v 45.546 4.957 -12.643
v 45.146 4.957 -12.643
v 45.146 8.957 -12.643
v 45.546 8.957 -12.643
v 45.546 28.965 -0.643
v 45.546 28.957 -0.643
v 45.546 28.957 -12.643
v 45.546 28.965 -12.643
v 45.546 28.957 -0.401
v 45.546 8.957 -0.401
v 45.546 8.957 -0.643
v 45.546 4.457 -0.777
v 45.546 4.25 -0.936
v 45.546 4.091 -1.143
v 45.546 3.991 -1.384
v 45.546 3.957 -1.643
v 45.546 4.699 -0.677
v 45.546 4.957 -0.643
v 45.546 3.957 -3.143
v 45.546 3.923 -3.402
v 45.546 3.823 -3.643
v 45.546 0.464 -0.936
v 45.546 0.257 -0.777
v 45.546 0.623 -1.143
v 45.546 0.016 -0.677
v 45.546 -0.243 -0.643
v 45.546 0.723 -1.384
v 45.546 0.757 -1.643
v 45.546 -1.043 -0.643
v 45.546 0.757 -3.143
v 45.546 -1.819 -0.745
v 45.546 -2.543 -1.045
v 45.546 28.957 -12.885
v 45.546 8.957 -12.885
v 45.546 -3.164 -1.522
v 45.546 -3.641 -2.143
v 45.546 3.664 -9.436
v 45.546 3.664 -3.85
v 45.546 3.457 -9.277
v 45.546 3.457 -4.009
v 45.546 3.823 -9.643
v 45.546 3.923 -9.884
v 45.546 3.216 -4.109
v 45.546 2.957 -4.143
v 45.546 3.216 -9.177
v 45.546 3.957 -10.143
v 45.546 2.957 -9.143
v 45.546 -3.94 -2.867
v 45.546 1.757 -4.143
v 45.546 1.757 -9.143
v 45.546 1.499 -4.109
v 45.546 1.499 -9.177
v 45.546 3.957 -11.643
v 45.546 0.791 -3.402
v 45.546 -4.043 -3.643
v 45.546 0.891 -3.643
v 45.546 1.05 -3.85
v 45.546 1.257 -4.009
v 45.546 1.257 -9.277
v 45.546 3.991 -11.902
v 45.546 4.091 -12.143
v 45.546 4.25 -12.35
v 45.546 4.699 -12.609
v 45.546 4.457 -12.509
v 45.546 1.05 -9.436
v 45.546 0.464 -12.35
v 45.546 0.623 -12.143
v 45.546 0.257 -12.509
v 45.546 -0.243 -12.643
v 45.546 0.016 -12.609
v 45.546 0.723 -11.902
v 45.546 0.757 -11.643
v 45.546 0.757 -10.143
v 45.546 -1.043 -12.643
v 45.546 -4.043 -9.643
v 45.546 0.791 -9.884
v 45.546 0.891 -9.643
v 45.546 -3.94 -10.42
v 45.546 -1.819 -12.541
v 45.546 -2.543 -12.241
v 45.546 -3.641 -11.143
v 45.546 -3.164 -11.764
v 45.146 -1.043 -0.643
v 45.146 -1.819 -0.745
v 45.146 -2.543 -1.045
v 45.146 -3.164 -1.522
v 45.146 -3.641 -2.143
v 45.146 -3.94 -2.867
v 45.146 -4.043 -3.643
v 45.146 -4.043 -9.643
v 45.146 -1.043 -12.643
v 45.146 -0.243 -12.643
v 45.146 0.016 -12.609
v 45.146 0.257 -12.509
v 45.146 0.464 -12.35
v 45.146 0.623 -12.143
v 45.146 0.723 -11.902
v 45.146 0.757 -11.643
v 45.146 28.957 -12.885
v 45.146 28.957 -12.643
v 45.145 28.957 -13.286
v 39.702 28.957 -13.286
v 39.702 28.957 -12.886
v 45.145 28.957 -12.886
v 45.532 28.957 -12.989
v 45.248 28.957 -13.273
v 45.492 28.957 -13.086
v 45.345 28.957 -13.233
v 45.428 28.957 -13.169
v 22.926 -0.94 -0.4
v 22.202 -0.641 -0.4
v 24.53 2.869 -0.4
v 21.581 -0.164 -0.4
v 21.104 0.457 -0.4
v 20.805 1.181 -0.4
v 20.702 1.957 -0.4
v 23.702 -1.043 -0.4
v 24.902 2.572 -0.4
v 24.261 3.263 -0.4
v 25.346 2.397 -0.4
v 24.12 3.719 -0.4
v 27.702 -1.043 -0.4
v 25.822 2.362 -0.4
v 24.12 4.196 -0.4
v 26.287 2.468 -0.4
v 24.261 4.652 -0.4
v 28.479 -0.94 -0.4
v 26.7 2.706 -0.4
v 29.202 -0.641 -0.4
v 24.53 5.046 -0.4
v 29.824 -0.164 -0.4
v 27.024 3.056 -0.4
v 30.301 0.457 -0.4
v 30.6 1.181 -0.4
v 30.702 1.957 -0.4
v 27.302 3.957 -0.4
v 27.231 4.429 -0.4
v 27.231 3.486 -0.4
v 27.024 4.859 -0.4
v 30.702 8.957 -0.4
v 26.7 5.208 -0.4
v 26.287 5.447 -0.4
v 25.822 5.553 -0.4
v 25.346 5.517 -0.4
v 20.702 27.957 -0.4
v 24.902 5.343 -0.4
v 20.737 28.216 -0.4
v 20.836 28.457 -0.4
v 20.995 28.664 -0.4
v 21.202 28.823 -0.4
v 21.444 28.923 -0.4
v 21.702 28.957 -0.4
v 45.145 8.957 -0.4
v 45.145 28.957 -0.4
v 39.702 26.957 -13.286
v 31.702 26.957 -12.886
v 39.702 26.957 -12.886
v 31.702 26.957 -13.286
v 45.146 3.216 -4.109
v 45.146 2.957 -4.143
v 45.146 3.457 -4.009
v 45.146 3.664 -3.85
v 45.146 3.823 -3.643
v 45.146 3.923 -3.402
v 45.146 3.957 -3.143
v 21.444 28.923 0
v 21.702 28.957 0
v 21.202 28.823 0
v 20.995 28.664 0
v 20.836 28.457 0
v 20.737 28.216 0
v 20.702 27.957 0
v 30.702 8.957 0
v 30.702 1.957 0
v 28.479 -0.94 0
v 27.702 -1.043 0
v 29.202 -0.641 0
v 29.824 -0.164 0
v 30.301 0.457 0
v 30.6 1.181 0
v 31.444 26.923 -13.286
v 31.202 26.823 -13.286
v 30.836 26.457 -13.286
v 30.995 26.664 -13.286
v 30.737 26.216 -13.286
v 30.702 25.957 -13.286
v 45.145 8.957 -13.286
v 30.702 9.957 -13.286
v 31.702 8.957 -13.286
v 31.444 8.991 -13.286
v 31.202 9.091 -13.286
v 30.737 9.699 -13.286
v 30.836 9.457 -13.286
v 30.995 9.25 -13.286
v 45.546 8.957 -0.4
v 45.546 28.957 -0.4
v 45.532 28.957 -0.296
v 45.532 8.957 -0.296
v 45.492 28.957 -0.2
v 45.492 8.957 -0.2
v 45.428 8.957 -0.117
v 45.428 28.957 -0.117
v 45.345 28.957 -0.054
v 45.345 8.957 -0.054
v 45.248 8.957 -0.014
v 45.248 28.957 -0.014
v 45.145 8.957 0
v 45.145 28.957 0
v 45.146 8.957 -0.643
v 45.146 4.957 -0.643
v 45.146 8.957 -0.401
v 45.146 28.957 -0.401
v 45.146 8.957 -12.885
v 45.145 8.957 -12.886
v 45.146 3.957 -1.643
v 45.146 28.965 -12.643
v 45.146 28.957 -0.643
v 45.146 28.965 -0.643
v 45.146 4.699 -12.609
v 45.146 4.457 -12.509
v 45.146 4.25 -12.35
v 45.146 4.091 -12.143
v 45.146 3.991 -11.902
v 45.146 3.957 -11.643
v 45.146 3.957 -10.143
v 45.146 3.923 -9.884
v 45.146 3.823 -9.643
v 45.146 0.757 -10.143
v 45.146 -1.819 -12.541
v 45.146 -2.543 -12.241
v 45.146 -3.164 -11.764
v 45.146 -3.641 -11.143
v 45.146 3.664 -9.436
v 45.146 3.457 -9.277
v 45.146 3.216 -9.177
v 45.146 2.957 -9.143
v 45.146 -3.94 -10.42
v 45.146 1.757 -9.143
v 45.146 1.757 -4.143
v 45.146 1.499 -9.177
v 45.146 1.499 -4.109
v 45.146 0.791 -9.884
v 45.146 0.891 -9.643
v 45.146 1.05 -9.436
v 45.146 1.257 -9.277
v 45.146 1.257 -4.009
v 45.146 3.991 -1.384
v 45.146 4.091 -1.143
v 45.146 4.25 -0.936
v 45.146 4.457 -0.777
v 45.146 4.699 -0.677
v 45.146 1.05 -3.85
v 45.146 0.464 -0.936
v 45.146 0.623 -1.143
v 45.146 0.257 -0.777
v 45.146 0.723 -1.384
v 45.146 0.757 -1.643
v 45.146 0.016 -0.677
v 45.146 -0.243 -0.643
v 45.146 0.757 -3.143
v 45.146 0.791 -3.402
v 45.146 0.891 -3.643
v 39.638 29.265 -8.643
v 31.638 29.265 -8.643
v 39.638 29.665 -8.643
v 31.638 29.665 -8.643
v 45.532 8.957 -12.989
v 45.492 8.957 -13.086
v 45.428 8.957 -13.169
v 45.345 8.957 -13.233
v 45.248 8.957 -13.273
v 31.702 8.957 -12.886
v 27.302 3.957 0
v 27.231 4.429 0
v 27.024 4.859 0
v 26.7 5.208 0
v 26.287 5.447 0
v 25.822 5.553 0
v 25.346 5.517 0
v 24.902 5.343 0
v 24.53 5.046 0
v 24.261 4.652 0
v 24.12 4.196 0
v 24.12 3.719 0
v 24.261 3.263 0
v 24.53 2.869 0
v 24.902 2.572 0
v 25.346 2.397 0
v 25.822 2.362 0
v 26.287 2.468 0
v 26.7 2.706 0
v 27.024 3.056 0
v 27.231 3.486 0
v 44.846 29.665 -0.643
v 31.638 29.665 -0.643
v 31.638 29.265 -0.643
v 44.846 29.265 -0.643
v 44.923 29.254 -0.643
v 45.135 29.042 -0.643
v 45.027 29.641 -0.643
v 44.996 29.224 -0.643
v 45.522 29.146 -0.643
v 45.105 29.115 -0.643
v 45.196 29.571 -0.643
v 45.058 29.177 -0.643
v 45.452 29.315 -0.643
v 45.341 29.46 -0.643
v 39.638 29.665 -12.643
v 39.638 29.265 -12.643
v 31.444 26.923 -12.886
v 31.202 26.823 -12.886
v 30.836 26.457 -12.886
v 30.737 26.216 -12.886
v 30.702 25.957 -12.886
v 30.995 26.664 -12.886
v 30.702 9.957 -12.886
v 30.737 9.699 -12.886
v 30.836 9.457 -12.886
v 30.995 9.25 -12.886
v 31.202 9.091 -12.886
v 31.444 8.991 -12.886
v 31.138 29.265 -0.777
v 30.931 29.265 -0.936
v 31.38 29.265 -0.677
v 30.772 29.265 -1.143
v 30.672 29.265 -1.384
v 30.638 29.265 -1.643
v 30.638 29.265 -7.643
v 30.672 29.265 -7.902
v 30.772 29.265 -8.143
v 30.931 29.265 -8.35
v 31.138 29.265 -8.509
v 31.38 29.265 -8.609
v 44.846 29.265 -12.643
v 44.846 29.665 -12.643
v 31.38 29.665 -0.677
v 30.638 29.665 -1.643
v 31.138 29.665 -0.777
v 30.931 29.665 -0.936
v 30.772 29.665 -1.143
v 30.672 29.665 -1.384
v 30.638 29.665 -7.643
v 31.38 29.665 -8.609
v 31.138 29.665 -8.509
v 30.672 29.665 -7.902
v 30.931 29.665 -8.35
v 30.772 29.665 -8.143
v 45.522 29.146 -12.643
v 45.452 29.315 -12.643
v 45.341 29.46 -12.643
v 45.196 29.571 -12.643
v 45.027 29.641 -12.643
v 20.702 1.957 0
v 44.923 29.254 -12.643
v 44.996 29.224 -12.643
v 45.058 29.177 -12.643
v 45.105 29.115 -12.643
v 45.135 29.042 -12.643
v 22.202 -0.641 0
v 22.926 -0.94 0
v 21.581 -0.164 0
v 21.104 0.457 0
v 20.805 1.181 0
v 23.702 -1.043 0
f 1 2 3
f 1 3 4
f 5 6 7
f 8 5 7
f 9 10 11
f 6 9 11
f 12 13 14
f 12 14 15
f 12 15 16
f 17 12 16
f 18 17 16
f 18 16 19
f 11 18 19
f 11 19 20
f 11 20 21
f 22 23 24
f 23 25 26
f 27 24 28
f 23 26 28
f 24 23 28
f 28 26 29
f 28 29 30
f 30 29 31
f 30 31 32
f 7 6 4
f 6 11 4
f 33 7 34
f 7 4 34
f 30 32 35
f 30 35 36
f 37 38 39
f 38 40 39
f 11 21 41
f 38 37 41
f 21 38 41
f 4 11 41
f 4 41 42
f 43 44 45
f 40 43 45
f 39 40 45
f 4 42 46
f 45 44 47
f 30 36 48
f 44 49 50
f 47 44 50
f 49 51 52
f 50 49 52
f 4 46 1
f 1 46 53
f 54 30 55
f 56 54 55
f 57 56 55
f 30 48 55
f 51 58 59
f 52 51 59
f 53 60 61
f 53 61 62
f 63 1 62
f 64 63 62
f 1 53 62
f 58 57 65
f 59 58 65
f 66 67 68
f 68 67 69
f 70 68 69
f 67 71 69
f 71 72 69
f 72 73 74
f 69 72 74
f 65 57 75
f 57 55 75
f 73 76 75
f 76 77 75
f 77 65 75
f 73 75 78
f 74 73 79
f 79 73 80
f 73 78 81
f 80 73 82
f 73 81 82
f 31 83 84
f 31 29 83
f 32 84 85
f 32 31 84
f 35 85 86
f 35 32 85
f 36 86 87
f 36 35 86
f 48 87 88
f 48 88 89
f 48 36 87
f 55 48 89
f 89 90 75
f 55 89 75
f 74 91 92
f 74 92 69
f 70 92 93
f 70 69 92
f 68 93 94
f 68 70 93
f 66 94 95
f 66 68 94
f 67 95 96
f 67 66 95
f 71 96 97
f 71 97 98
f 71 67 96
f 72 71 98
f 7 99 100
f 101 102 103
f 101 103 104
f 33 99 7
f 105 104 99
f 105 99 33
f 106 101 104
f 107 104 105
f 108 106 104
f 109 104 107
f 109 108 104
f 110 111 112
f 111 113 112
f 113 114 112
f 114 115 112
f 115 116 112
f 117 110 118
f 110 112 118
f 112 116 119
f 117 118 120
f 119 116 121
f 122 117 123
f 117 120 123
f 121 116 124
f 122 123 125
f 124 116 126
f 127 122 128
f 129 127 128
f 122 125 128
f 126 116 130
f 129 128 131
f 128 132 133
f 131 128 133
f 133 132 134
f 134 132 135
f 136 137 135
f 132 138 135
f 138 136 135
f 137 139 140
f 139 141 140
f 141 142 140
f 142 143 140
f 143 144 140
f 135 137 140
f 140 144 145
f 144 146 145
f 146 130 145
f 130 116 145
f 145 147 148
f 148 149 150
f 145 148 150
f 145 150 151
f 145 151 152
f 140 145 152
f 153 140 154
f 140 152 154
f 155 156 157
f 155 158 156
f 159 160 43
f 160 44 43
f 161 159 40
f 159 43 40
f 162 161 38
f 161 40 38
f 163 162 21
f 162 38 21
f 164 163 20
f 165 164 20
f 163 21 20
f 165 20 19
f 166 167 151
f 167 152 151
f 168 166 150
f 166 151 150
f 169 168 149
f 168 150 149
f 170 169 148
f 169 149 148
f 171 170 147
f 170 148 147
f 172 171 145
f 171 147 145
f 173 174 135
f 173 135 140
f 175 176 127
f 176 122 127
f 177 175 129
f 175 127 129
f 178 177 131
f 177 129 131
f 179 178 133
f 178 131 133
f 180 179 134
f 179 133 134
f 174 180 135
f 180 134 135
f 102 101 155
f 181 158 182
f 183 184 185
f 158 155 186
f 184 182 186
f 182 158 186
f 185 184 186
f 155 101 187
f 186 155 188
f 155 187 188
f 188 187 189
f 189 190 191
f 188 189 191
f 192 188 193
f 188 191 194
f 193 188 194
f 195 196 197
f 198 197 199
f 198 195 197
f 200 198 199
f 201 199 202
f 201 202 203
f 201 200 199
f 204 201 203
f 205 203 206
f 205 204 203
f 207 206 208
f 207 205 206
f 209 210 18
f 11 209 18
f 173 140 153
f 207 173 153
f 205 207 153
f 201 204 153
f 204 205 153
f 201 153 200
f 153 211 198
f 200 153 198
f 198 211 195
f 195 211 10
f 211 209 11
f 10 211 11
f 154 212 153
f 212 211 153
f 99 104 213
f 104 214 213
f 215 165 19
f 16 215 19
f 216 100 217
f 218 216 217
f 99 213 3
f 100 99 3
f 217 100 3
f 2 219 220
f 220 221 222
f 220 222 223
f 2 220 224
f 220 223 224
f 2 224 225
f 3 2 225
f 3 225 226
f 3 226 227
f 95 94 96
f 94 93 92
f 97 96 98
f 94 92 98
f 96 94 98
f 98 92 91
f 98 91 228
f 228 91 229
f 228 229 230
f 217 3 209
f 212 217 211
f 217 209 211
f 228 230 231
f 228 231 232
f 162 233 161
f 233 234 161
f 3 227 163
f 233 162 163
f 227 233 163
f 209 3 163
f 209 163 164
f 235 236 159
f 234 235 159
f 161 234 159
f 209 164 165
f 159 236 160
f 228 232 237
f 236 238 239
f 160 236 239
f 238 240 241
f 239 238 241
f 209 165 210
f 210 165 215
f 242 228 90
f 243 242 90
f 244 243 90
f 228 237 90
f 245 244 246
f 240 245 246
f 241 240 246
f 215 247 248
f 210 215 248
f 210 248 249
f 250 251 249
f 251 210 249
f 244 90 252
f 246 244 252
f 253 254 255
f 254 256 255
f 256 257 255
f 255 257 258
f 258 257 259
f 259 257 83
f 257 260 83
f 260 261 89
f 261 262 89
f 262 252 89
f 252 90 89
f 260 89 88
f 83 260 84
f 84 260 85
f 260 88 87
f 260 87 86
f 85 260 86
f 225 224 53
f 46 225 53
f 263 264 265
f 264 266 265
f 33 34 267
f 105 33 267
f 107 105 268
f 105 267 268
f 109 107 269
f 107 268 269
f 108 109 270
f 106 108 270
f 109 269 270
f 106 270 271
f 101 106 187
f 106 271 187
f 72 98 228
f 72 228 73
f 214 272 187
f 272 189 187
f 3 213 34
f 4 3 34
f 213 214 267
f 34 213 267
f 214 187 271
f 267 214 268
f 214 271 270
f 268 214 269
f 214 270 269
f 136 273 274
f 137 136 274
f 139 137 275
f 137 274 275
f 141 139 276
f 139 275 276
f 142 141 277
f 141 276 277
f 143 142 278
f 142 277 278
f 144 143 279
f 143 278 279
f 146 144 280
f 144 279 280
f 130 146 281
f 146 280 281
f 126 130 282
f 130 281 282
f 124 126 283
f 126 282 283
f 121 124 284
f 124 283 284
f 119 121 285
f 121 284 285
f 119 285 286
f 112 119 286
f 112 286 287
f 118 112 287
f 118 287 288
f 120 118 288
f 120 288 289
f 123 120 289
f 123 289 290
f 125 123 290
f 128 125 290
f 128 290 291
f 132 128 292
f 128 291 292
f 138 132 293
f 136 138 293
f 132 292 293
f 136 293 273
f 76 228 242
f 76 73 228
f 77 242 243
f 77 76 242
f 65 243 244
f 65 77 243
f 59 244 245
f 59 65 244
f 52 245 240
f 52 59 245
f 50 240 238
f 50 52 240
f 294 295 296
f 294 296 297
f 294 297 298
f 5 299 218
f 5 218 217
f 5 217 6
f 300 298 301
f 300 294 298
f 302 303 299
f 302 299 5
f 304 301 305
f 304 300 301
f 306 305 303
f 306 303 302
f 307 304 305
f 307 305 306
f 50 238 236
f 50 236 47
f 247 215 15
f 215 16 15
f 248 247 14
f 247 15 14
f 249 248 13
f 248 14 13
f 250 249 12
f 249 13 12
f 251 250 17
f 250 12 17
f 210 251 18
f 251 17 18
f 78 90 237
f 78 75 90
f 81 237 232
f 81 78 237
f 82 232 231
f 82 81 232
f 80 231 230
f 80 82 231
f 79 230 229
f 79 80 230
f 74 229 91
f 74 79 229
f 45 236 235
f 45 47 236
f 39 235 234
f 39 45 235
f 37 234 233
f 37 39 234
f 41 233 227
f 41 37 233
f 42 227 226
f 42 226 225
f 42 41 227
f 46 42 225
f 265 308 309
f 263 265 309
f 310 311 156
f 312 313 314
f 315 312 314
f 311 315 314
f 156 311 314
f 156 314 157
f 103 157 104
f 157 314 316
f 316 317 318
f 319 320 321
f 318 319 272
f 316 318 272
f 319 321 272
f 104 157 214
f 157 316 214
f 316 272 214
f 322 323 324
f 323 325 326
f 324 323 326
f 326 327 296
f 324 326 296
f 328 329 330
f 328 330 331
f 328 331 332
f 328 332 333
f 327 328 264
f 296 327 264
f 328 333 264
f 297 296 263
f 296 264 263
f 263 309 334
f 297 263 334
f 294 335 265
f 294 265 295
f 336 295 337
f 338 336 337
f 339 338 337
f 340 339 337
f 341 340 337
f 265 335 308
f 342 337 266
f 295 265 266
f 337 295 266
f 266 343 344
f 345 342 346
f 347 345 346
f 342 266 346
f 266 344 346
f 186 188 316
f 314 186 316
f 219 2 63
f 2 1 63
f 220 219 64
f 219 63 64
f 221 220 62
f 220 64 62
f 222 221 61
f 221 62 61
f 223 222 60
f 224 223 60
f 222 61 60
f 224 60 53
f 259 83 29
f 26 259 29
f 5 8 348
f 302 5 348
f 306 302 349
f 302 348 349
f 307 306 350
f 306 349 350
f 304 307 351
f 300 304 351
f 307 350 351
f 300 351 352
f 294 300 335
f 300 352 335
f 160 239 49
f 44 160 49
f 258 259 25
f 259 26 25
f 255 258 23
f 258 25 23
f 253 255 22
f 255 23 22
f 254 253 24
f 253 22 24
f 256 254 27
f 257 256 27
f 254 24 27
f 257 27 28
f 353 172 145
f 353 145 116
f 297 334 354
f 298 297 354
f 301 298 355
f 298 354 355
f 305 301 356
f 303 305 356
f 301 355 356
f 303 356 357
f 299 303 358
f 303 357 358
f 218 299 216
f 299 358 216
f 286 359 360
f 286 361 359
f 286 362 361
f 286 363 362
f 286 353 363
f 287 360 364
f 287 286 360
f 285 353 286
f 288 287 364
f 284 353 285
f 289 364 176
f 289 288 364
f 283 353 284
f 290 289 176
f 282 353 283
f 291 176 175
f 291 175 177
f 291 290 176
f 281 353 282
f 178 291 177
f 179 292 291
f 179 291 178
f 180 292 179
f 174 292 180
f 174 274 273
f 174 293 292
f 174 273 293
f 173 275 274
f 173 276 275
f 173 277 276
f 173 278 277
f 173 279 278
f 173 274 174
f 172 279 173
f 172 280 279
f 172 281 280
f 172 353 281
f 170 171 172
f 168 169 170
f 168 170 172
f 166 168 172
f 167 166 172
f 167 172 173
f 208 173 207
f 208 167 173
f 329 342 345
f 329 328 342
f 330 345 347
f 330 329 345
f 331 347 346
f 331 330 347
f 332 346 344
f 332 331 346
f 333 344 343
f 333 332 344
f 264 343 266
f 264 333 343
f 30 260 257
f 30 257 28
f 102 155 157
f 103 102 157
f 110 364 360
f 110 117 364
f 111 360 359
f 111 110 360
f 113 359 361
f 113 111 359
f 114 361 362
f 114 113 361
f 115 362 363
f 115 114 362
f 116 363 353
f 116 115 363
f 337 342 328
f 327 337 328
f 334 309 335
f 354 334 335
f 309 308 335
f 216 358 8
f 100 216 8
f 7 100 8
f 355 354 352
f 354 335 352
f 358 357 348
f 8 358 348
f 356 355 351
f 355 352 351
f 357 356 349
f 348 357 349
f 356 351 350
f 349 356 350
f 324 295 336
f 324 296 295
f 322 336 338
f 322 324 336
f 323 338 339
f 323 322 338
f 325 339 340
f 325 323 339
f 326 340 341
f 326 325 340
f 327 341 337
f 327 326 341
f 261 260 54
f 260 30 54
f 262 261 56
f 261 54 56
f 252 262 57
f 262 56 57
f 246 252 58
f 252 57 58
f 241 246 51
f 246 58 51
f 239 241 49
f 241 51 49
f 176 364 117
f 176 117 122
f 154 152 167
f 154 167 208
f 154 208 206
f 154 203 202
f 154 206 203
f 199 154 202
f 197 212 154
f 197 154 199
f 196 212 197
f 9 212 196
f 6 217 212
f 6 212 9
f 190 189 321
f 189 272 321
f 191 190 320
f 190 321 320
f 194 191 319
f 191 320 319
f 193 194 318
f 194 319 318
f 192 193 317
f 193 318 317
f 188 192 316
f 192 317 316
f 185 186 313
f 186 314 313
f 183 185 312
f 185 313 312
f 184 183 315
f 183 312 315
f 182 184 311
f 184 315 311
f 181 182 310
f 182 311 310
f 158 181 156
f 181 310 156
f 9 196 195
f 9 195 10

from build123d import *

# Parameters (mm, degrees)
SKETCH1_R                   = 1.6
BASE_FLANGE1_DEPTH          = 0.4
SKETCHED_START              = 45.702497433
SKETCHED_BEND8_DEPTH        = 12
SKETCHED_BEND8_2_DEPTH      = 8
SKETCHED_START_2            = 53.702497433
SKETCHED_BEND8_3_DEPTH      = 4
SKETCHED_START_3            = -4.042672779
SKETCHED_BEND12_DEPTH       = 33.707300919
SKETCHED_START_4            = 8.957327221
SKETCHED_BEND12_2_DEPTH     = 18
SKETCHED_START_5            = 3.957327221
SKETCHED_BEND12_3_OUTLINE_W = 0.4
SKETCHED_BEND12_3_OUTLINE_H = 12
SKETCHED_BEND12_3_DEPTH     = 25.007300919
SKETCHED_BEND12_4_OUTLINE_W = 0.4
SKETCHED_BEND12_4_OUTLINE_H = 12
SKETCHED_BEND12_4_DEPTH     = 4.8
SKETCHED_START_6            = 0.757327221
SKETCHED_BEND12_5_OUTLINE_W = 0.4
SKETCHED_BEND12_5_OUTLINE_H = 5
SKETCHED_BEND12_5_DEPTH     = 3.2
SKETCHED_START_7            = 26.957327221
SKETCHED_BEND12_6_DEPTH     = 2
SKETCHED_START_8            = -8.643134969
SKETCHED_BEND12_7_DEPTH     = 8
SKETCHED_START_9            = -12.643134969
SKETCHED_BEND12_8_DEPTH     = 4
FILLET1_R                   = 3
FILLET2_R                   = 1
FILLET3_R                   = 1


with BuildPart() as part:
    # Base-Flange1: sheet metal written as solids
    # Sketch1 → Base-Flange1 (new body)
    with BuildSketch(Plane.XY):
        Polygon((30.702497433, -1.042672779), (30.702497433, 8.957327221), (45.702497433, 8.957327221), (45.702497433, 3.957327221), (49.202497433, 3.957327221), (49.202497433, 0.757327221), (45.702497433, 0.757327221), (45.702497433, -4.042672779), (57.702497433, -4.042672779), (57.702497433, 0.757327221), (54.202497433, 0.757327221), (54.202497433, 3.957327221), (57.702497433, 3.957327221), (57.702497433, 8.957327221), (72.702497433, 8.957327221), (72.702497433, 26.957327221), (63.702497433, 26.957327221), (63.702497433, 28.957327221), (57.702497433, 28.957327221), (57.702497433, 34.957327221), (53.702497433, 34.957327221), (53.702497433, 43.957327221), (45.702497433, 43.957327221), (45.702497433, 28.957327221), (20.702497433, 28.957327221), (20.702497433, -1.042672779), align=None)
        with Locations((25.702497433, 3.957327221)):
            Circle(SKETCH1_R, mode=Mode.SUBTRACT)
    extrude(amount=-BASE_FLANGE1_DEPTH)

    # Sketched Bend8: read off the stored shape, not the designer's step
    # Sketched Bend8 outline → Sketched Bend8 (cut)
    with BuildSketch(Plane.YZ.offset(SKETCHED_START)):
        with BuildLine():
            ThreePointArc((28.96462814, 0), (29.338793878, -0.108392022), (29.597083672, -0.4))
            Line((29.597083672, -0.4), (43.957327221, -0.4))
            Line((43.957327221, -0.4), (43.957327221, 0))
            Line((43.957327221, 0), (28.96462814, 0))
        make_face()
    extrude(amount=SKETCHED_BEND8_DEPTH, mode=Mode.SUBTRACT)

    # Sketched Bend8 2 outline → Sketched Bend8 2 (add)
    with BuildSketch(Plane.YZ.offset(SKETCHED_START)):
        with BuildLine():
            Line((29.26462814, -14.907300918), (29.66462814, -14.907300918))
            Line((29.66462814, -14.907300918), (29.66462814, -0.7))
            ThreePointArc((29.66462814, -0.7), (29.647533284, -0.546245118), (29.597083672, -0.4))
            Line((29.597083672, -0.4), (28.96462814, -0.4))
            ThreePointArc((28.96462814, -0.4), (29.176760174, -0.487867966), (29.26462814, -0.7))
            Line((29.26462814, -0.7), (29.26462814, -14.907300918))
        make_face()
    extrude(amount=SKETCHED_BEND8_2_DEPTH)

    # Sketched Bend8 3 outline → Sketched Bend8 3 (add)
    with BuildSketch(Plane.YZ.offset(SKETCHED_START_2)):
        with BuildLine():
            Line((29.26462814, -0.7), (29.26462814, -5.907300918))
            Line((29.26462814, -5.907300918), (29.66462814, -5.907300918))
            Line((29.66462814, -5.907300918), (29.66462814, -0.7))
            ThreePointArc((29.66462814, -0.7), (29.647533284, -0.546245118), (29.597083672, -0.4))
            Line((29.597083672, -0.4), (28.96462814, -0.4))
            ThreePointArc((28.96462814, -0.4), (29.176760174, -0.487867966), (29.26462814, -0.7))
        make_face()
    extrude(amount=SKETCHED_BEND8_3_DEPTH)

    # Sketched Bend12: read off the stored shape, not the designer's step
    # Sketched Bend12 outline → Sketched Bend12 (cut)
    with BuildSketch(Plane(origin=(0, 0, 0), x_dir=(1, 0, 0), z_dir=(0, 1, 0)).offset(SKETCHED_START_3)):
        with BuildLine():
            Line((45.702497433, 0.4), (45.545631155, 0.4))
            ThreePointArc((45.545631155, 0.4), (45.427828447, 0.117096847), (45.144632402, 0))
            Line((45.144632402, 0), (72.702497433, 0))
            Line((72.702497433, 0), (72.702497433, 0.4))
            Line((72.702497433, 0.4), (57.702497433, 0.4))
            Line((57.702497433, 0.4), (57.702497433, 5.907300918))
            Line((57.702497433, 5.907300918), (53.702497433, 5.907300918))
            Line((53.702497433, 5.907300918), (53.702497433, 14.907300918))
            Line((53.702497433, 14.907300918), (45.702497433, 14.907300918))
            Line((45.702497433, 14.907300918), (45.702497433, 0.4))
        make_face()
    extrude(amount=SKETCHED_BEND12_DEPTH, mode=Mode.SUBTRACT)

    # Sketched Bend12 2 outline → Sketched Bend12 2 (add)
    with BuildSketch(Plane(origin=(0, 0, 0), x_dir=(1, 0, 0), z_dir=(0, 1, 0)).offset(SKETCHED_START_4)):
        with BuildLine():
            ThreePointArc((45.145632402, 0.401), (45.145339509, 0.400292893), (45.144632402, 0.4))
            Line((45.144632402, 0.4), (45.545631155, 0.4))
            ThreePointArc((45.545631155, 0.4), (45.54563209, 0.4005), (45.545632402, 0.401))
            Line((45.545632402, 0.401), (45.545632402, 12.885269938))
            ThreePointArc((45.545632402, 12.885269938), (45.428182222, 13.168819758), (45.144632402, 13.286269938))
            Line((45.144632402, 13.286269938), (30.702497433, 13.286269938))
            Line((30.702497433, 13.286269938), (30.702497433, 12.886269938))
            Line((30.702497433, 12.886269938), (45.144632402, 12.886269938))
            ThreePointArc((45.144632402, 12.886269938), (45.145339509, 12.885977045), (45.145632402, 12.885269938))
            Line((45.145632402, 12.885269938), (45.145632402, 0.401))
        make_face()
    extrude(amount=SKETCHED_BEND12_2_DEPTH)

    # Sketched Bend12 3 outline → Sketched Bend12 3 (add)
    with BuildSketch(Plane(origin=(0, 0, 0), x_dir=(1, 0, 0), z_dir=(0, 1, 0)).offset(SKETCHED_START_5)):
        with Locations((45.345632402, 6.643134969)):
            Rectangle(SKETCHED_BEND12_3_OUTLINE_W, SKETCHED_BEND12_3_OUTLINE_H)
    extrude(amount=SKETCHED_BEND12_3_DEPTH)



with BuildPart() as body_2:
    # Sketched Bend12 4 outline → Sketched Bend12 4 (new body)
    with BuildSketch(Plane(origin=(0, 0, 0), x_dir=(1, 0, 0), z_dir=(0, 1, 0)).offset(SKETCHED_START_3)):
        with Locations((45.345632402, 6.643134969)):
            Rectangle(SKETCHED_BEND12_4_OUTLINE_W, SKETCHED_BEND12_4_OUTLINE_H)
    extrude(amount=SKETCHED_BEND12_4_DEPTH)


with BuildPart() as part_1:
    add(part.part)

    add(body_2.part)  # Sketched Bend12 5 merges body 2
    # Sketched Bend12 5 outline → Sketched Bend12 5 (add)
    with BuildSketch(Plane(origin=(0, 0, 0), x_dir=(1, 0, 0), z_dir=(0, 1, 0)).offset(SKETCHED_START_6)):
        with Locations((45.345632402, 6.643134969)):
            Rectangle(SKETCHED_BEND12_5_OUTLINE_W, SKETCHED_BEND12_5_OUTLINE_H)
    extrude(amount=SKETCHED_BEND12_5_DEPTH)

    # Sketched Bend12 6 outline → Sketched Bend12 6 (add)
    with BuildSketch(Plane(origin=(0, 0, 0), x_dir=(1, 0, 0), z_dir=(0, 1, 0)).offset(SKETCHED_START_7)):
        with BuildLine():
            Line((45.145632402, 0.643134969), (45.145632402, 0.401))
            ThreePointArc((45.145632402, 0.401), (45.145339509, 0.400292893), (45.144632402, 0.4))
            Line((45.144632402, 0.4), (45.545631155, 0.4))
            ThreePointArc((45.545631155, 0.4), (45.54563209, 0.4005), (45.545632402, 0.401))
            Line((45.545632402, 0.401), (45.545632402, 0.643134969))
            Line((45.545632402, 0.643134969), (45.145632402, 0.643134969))
        make_face()
        with BuildLine():
            Line((45.145632402, 12.885269938), (45.145632402, 12.643134969))
            Line((45.145632402, 12.643134969), (45.545632402, 12.643134969))
            Line((45.545632402, 12.643134969), (45.545632402, 12.885269938))
            ThreePointArc((45.545632402, 12.885269938), (45.428182222, 13.168819758), (45.144632402, 13.286269938))
            Line((45.144632402, 13.286269938), (39.702497433, 13.286269938))
            Line((39.702497433, 13.286269938), (39.702497433, 12.886269938))
            Line((39.702497433, 12.886269938), (45.144632402, 12.886269938))
            ThreePointArc((45.144632402, 12.886269938), (45.145339509, 12.885977045), (45.145632402, 12.885269938))
        make_face()
    extrude(amount=SKETCHED_BEND12_6_DEPTH)

    # Sketched Bend12 7 outline → Sketched Bend12 7 (add)
    with BuildSketch(Plane.XY.offset(SKETCHED_START_8)):
        with BuildLine():
            ThreePointArc((44.845632402, 29.26462814), (45.057764437, 29.176760175), (45.145632402, 28.96462814))
            Line((45.145632402, 28.96462814), (45.545632402, 28.96462814))
            ThreePointArc((45.545632402, 28.96462814), (45.340607148, 29.459602887), (44.845632402, 29.66462814))
            Line((44.845632402, 29.66462814), (30.638331484, 29.66462814))
            Line((30.638331484, 29.66462814), (30.638331484, 29.26462814))
            Line((30.638331484, 29.26462814), (44.845632402, 29.26462814))
        make_face()
    extrude(amount=SKETCHED_BEND12_7_DEPTH)

    # Sketched Bend12 8 outline → Sketched Bend12 8 (add)
    with BuildSketch(Plane.XY.offset(SKETCHED_START_9)):
        with BuildLine():
            Line((39.638331484, 29.26462814), (44.845632402, 29.26462814))
            ThreePointArc((44.845632402, 29.26462814), (45.057764437, 29.176760175), (45.145632402, 28.96462814))
            Line((45.145632402, 28.96462814), (45.545632402, 28.96462814))
            ThreePointArc((45.545632402, 28.96462814), (45.340607148, 29.459602887), (44.845632402, 29.66462814))
            Line((44.845632402, 29.66462814), (39.638331484, 29.66462814))
            Line((39.638331484, 29.66462814), (39.638331484, 29.26462814))
        make_face()
    extrude(amount=SKETCHED_BEND12_8_DEPTH)

    # Fillet1
    fillet1_edges = [part_1.edges().sort_by_distance(p)[0] for p in [
        (45.345632402, -4.042672779, -0.643134969),
        (45.345632402, -4.042672779, -12.643134969),
        (20.702497433, -1.042672779, -0.2),
        (30.702497433, -1.042672779, -0.2),
    ]]
    fillet(fillet1_edges, radius=FILLET1_R)

    # Fillet2
    fillet2_edges = [part_1.edges().sort_by_distance(p)[0] for p in [
        (20.702497433, 28.957327221, -0.2),
        (30.702497433, 26.957327221, -13.086269938),
        (30.702497433, 8.957327221, -13.086269938),
        (30.638331484, 29.46462814, -0.643134969),
        (30.638331484, 29.46462814, -8.643134969),
    ]]
    fillet(fillet2_edges, radius=FILLET2_R)

    # Fillet3
    fillet3_edges = [part_1.edges().sort_by_distance(p)[0] for p in [
        (45.345632402, 3.957327221, -0.643134969),
        (45.345632402, 3.957327221, -4.143134969),
        (45.345632402, 0.757327221, -4.143134969),
        (45.345632402, 0.757327221, -0.643134969),
        (45.345632402, 0.757327221, -12.643134969),
        (45.345632402, 0.757327221, -9.143134969),
        (45.345632402, 3.957327221, -9.143134969),
        (45.345632402, 3.957327221, -12.643134969),
    ]]
    fillet(fillet3_edges, radius=FILLET3_R)


solid = part_1.part
